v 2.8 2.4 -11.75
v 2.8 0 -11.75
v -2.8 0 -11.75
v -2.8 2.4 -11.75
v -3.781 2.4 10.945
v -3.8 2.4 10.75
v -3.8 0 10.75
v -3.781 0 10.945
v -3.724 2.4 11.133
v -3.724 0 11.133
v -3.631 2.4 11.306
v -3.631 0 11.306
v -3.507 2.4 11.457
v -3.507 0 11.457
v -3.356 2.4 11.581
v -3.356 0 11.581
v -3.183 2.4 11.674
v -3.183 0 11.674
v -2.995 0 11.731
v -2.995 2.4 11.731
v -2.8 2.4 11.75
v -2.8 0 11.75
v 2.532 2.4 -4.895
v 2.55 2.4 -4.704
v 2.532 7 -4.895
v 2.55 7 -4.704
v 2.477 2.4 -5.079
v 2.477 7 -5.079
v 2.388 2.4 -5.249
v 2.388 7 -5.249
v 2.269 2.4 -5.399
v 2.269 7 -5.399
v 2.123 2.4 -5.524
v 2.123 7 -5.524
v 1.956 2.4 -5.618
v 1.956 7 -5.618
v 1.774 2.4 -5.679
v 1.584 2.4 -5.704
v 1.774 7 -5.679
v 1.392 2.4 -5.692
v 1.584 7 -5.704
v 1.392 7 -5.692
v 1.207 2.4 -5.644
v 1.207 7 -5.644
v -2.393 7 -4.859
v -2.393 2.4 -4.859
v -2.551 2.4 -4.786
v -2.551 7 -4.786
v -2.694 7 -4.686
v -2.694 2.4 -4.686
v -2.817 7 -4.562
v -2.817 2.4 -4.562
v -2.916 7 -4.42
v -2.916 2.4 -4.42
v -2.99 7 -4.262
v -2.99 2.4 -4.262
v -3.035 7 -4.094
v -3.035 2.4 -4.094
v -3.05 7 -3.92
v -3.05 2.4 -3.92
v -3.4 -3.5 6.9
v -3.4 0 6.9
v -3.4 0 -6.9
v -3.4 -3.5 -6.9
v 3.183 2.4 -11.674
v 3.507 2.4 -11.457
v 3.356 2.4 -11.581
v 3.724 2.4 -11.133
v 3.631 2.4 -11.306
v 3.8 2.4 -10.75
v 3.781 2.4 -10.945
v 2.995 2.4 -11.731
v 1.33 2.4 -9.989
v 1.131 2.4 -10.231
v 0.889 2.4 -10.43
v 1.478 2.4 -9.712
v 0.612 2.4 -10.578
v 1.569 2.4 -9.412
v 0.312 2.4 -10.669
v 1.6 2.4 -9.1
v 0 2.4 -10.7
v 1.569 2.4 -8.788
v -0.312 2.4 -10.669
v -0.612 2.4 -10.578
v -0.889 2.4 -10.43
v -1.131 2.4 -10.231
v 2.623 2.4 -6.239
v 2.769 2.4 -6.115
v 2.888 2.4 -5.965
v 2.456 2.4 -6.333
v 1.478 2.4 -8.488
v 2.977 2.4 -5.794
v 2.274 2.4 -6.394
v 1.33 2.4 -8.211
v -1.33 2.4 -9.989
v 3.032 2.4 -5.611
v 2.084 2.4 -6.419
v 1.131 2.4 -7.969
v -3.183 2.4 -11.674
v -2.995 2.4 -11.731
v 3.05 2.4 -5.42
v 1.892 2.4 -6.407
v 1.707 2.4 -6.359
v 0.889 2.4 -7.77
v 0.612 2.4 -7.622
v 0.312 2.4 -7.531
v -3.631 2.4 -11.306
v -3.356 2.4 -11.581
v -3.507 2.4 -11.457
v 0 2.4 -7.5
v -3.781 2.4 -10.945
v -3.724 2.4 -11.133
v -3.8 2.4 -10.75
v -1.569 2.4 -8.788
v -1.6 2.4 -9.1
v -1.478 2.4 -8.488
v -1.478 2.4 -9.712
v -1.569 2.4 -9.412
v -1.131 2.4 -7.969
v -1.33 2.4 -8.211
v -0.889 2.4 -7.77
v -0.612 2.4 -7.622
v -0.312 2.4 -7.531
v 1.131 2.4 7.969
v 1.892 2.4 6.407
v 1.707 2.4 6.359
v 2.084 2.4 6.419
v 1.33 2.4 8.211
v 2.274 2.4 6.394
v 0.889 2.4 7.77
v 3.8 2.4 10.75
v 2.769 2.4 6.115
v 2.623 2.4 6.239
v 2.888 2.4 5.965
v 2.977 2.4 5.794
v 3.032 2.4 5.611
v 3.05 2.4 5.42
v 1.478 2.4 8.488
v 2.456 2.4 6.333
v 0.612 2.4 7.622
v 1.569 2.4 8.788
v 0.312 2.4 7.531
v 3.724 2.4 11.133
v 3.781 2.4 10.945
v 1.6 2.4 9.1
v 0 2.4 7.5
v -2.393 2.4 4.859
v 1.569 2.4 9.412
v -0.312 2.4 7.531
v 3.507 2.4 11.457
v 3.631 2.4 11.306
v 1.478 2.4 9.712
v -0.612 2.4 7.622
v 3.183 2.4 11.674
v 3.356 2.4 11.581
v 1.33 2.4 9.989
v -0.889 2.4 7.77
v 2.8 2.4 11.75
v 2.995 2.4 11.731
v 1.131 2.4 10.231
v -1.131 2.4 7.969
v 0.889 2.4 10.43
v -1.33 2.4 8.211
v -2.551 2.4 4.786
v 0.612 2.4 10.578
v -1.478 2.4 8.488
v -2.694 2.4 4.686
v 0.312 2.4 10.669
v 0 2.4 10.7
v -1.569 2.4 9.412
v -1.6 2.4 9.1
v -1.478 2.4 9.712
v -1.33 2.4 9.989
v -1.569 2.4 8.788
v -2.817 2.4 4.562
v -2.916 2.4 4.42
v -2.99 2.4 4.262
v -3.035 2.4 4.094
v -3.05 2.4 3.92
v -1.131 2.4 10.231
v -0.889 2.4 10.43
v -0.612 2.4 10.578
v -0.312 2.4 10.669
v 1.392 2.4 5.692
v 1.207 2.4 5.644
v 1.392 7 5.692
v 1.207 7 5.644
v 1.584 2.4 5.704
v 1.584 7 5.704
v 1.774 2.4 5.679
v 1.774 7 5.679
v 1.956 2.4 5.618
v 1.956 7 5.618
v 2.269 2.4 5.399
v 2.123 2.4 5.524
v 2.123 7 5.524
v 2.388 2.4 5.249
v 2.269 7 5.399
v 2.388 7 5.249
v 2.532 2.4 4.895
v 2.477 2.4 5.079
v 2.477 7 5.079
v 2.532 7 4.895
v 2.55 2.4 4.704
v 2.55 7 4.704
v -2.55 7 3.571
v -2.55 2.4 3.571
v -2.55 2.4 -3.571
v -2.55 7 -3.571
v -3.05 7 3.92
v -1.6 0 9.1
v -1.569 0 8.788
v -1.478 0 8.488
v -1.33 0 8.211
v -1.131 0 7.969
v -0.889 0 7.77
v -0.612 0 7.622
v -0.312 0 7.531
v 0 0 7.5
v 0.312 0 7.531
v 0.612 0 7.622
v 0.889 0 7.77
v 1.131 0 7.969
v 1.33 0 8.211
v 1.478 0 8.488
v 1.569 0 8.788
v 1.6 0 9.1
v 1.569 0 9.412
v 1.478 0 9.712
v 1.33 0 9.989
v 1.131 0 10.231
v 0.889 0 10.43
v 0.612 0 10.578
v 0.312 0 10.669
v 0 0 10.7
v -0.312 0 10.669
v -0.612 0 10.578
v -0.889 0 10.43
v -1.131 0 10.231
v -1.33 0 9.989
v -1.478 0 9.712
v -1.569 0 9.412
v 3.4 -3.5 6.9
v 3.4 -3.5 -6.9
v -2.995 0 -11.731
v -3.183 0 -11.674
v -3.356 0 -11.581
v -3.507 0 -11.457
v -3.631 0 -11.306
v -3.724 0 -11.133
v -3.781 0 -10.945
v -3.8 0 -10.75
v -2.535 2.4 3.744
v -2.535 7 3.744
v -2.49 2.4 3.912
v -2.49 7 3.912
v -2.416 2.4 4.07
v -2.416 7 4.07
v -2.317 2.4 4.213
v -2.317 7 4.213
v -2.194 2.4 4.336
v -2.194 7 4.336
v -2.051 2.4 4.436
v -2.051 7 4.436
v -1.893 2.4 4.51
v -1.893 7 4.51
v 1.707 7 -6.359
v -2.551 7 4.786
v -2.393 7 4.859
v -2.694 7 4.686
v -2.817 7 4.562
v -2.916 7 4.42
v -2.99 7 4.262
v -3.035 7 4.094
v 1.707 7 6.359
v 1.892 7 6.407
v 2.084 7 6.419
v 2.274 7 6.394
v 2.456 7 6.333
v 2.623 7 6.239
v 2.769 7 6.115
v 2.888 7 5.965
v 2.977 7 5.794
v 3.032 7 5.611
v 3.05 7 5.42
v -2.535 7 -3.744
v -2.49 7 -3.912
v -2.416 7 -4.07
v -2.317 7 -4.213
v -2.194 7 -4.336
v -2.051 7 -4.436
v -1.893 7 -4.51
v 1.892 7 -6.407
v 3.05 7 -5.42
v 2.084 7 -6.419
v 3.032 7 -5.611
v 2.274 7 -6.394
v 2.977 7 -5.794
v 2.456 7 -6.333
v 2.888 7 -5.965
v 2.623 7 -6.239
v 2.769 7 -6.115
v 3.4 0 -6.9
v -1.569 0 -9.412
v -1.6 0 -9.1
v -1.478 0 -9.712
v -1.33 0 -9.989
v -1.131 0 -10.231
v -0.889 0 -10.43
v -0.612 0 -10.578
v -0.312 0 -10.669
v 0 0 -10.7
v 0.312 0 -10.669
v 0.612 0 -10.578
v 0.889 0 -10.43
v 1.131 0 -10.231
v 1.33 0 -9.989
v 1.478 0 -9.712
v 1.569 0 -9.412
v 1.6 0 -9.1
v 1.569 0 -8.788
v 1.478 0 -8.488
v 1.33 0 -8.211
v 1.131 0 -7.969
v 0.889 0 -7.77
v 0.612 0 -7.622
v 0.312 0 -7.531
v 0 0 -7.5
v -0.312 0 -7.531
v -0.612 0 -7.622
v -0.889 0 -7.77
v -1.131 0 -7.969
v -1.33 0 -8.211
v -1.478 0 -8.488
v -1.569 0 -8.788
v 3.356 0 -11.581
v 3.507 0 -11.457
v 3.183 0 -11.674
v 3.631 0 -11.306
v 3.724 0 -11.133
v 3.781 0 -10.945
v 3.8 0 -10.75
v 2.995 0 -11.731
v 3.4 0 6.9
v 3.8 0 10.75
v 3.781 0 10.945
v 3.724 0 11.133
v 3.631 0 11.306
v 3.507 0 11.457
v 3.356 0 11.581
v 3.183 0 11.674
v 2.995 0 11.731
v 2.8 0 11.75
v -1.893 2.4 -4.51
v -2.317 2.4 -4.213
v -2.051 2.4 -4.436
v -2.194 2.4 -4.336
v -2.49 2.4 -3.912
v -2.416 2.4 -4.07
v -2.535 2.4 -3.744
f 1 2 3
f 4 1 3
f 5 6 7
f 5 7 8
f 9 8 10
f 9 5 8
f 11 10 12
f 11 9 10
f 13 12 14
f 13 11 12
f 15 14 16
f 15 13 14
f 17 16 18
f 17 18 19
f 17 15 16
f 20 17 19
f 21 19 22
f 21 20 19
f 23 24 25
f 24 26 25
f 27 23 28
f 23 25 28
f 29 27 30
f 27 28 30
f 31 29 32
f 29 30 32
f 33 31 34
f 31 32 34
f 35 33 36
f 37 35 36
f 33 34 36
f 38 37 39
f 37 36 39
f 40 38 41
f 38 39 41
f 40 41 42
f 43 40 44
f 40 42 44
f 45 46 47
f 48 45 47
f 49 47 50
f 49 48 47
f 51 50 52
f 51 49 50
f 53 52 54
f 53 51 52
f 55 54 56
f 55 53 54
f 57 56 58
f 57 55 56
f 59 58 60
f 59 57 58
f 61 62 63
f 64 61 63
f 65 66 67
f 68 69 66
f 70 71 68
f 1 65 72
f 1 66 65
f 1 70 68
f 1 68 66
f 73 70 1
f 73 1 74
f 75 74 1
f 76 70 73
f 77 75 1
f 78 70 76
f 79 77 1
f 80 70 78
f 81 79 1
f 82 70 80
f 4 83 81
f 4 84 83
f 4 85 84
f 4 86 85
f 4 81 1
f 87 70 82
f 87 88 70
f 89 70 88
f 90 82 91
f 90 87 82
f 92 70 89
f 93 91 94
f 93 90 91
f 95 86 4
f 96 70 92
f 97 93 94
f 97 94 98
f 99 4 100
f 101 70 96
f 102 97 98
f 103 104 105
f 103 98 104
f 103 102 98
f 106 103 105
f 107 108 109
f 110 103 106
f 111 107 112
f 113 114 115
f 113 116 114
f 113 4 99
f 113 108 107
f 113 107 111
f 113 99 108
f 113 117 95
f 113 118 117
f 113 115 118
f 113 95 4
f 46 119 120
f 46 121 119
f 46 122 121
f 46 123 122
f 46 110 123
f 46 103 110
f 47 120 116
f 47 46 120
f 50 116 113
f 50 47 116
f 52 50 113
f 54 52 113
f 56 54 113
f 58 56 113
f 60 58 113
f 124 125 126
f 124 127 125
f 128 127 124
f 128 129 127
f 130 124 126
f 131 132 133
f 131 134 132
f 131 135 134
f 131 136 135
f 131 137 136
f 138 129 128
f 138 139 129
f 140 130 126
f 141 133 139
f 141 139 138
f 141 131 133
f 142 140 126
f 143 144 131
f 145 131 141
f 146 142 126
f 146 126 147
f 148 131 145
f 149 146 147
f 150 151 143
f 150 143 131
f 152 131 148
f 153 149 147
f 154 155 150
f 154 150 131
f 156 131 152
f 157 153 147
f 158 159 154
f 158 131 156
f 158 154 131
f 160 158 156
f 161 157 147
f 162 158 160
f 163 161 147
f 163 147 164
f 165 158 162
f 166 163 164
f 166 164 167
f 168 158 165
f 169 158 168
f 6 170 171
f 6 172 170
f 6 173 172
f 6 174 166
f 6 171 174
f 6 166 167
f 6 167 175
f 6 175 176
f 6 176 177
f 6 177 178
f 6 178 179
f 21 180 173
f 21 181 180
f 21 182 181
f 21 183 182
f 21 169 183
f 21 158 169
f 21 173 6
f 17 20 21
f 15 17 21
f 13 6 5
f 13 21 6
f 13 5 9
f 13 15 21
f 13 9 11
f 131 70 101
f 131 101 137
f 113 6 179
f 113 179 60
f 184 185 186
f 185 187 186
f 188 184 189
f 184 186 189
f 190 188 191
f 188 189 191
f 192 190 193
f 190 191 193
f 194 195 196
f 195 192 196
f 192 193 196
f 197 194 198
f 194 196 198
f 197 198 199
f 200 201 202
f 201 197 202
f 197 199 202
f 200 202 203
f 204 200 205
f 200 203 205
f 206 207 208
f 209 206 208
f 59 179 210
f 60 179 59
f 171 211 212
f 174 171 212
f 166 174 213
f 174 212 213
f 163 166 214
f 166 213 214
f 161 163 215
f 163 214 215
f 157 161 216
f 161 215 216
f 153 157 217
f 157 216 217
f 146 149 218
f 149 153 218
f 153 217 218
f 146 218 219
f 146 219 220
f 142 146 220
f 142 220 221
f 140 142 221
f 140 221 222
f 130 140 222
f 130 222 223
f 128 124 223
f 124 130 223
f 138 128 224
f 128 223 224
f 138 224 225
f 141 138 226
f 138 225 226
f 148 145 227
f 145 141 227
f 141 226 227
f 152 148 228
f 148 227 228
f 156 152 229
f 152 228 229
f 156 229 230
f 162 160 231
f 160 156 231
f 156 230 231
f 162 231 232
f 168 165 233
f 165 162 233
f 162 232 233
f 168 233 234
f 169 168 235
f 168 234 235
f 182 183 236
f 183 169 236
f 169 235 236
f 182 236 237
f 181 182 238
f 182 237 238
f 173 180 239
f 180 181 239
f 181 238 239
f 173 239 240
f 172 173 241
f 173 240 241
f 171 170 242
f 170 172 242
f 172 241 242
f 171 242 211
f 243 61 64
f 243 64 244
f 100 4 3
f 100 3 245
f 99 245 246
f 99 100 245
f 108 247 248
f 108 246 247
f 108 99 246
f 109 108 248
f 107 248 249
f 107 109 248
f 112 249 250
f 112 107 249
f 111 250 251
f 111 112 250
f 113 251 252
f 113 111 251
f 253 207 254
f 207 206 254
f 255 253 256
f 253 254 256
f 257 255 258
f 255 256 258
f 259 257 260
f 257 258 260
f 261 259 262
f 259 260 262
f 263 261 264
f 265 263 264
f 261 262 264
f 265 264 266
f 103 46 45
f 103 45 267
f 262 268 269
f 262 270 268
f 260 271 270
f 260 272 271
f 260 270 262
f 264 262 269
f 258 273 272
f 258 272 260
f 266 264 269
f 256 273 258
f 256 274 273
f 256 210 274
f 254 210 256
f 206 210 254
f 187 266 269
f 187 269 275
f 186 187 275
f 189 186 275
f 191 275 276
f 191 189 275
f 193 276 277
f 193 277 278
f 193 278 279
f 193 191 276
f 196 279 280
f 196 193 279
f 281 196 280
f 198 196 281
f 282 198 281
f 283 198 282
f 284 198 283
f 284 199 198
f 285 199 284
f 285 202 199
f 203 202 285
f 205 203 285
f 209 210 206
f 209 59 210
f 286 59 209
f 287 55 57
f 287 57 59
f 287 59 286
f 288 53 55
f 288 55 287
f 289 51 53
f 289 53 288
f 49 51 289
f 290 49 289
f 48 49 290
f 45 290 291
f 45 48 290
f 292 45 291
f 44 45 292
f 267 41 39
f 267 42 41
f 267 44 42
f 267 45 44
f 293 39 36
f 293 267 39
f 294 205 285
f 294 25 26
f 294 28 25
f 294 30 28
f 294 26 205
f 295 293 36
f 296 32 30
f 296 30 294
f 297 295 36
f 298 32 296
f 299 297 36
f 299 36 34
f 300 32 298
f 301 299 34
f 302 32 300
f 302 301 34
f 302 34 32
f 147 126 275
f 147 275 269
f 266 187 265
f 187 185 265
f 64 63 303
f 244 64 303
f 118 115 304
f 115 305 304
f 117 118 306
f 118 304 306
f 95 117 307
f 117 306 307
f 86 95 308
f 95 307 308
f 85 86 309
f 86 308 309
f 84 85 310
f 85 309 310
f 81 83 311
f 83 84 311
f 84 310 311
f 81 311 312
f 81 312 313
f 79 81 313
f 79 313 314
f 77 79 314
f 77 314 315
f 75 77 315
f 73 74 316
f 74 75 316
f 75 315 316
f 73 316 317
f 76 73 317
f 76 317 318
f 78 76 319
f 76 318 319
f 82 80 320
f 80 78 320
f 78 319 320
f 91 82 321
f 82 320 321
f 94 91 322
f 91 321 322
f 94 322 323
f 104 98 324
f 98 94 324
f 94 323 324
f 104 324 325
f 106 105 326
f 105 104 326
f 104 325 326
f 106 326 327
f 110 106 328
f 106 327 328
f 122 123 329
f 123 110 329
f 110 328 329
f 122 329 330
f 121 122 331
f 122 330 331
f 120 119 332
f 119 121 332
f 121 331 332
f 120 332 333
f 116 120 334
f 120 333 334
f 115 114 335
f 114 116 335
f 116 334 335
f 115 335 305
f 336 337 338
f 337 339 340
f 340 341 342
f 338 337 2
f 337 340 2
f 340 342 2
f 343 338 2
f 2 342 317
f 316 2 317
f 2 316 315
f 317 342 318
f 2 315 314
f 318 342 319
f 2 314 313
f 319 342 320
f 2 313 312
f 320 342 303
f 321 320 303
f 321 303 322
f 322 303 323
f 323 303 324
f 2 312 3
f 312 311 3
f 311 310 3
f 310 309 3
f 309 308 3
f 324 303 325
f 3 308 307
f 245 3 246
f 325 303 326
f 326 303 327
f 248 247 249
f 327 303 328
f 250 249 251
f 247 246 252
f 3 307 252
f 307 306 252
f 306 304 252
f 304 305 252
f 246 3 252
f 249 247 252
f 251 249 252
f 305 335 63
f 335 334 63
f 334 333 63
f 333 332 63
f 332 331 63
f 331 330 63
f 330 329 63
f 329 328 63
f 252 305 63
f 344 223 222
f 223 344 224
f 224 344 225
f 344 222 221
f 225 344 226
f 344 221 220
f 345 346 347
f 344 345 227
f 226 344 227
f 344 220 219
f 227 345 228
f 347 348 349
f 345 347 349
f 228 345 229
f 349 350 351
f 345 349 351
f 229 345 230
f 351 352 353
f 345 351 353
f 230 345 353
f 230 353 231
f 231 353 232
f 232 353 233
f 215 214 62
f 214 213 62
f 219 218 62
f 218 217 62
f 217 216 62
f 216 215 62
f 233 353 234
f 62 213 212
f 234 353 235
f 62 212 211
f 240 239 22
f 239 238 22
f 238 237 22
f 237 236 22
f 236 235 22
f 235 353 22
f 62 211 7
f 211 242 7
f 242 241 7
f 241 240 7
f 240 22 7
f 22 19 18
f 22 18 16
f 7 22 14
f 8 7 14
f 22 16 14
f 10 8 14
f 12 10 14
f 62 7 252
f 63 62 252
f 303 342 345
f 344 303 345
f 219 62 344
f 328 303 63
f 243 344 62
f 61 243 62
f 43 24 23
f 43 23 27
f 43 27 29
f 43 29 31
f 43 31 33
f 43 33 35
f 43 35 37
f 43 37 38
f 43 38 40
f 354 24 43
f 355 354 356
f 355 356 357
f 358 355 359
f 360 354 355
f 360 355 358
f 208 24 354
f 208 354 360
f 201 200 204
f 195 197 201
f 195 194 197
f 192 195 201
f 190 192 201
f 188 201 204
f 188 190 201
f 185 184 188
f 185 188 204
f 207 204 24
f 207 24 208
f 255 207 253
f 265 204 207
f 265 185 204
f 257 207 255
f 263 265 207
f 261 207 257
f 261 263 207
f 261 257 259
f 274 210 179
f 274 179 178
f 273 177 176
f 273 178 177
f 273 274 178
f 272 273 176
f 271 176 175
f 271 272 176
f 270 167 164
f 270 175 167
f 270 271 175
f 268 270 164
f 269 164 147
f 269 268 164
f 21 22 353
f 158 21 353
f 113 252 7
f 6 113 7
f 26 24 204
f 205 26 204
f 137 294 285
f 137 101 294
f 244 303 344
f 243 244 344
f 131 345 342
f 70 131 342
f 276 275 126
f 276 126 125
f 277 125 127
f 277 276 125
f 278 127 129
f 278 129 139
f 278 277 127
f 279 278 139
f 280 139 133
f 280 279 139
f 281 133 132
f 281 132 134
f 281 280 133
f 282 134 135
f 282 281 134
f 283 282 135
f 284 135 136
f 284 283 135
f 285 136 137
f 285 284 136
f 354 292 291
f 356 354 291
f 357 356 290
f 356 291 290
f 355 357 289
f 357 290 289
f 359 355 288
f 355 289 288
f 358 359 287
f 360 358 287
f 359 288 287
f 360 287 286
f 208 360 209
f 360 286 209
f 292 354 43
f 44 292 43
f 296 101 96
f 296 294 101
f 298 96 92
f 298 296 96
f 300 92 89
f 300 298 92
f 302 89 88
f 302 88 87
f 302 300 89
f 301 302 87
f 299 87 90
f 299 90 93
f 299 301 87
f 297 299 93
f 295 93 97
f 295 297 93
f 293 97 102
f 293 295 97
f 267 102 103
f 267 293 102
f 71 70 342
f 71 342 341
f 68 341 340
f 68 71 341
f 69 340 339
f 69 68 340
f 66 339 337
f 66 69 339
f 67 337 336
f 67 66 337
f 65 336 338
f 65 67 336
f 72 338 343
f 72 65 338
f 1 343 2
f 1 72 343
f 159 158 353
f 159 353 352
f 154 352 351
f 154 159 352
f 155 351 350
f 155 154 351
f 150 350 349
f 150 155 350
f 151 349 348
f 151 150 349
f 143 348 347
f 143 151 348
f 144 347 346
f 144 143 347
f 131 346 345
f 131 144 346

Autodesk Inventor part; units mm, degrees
ref_plane "YZ Plane" through (0, 0, 0) normal (1, 0, 0) x (0, 1, 0)
ref_plane "XZ Plane" through (0, 0, 0) normal (0, 1, 0) x (-1, 0, 0)
ref_plane "XY Plane" through (0, 0, 0) normal (0, 0, 1) x (1, 0, 0)
sketch "Sketch1" plane through (0, 0, 0) normal (0, 1, 0) x (-1, 0, 0)
  line L0 (3.8, 11.75) -> (-3.8, 11.75)
  line L1 (-3.8, 11.75) -> (-3.8, -11.75)
  line L2 (-3.8, -11.75) -> (3.8, -11.75)
  line L3 (3.8, -11.75) -> (3.8, 11.75)
  circle A0 centre (0, 9.1) radius 1.6
  circle A1 centre (0, -9.1) radius 1.6
  point P0 (0, 0)
  dimension "d0" = 23.5
  dimension "d1" = 7.6
  dimension "d2" = 11.75
  dimension "d3" = 3.8
  dimension "d4" = 3.2
  dimension "d5" = 3.2
  dimension "d6" = 18.2
  dimension "d7" = 9.1
extrude "Extrusion1" add sketch "Sketch1" along normal blind 2.4
fillet "Fillet1" radius 1 4 edges at (3.8, 1.2, 11.75) (-3.8, 1.2, 11.75) (3.8, 1.2, -11.75) (-3.8, 1.2, -11.75)
sketch "Sketch2" plane through (0, 2.4, 0) normal (0, 1, 0) x (1, 0, 0)
  line L0 (-3.05, -4.6194) -> (-3.05, 4.6194)
  line L1 (-3.05, 4.6194) -> (3.05, 6.85)
  line L2 (3.05, 6.85) -> (3.05, -6.85)
  line L3 (3.05, -6.85) -> (-3.05, -4.6194)
  line L4 (2.55, -6.1348) -> (-2.55, -4.2698)
  line L5 (-2.55, -4.2698) -> (-2.55, 4.2698)
  line L6 (-2.55, 4.2698) -> (2.55, 6.1348)
  line L7 (2.55, 6.1348) -> (2.55, -6.1348)
  point P0 (0, 0)
  dimension "d11" = 69.914
  dimension "d13" = 13.7
  dimension "d14" = 6.1
  dimension "d15" = 3.05
  dimension "d17" = 0.5
  dimension "d18" = 0.5
  dimension "d19" = 0.5
  dimension "d20" = 0.5
  dimension "d21" = 6.85
  dimension "d22" = 69.914
  dimension "d23" = 69.914
extrude "Extrusion2" add sketch "Sketch2" along normal blind 4.6
fillet "Fillet2" radius 1 8 edges at (-3.05, 4.7, -4.6194) (-3.05, 4.7, 4.6194) (3.05, 4.7, 6.85) (3.05, 4.7, -6.85) (-2.55, 4.7, -4.2698) (-2.55, 4.7, 4.2698) (2.55, 4.7, -6.1348) (2.55, 4.7, 6.1348)
sketch "Sketch3" plane through (0, 0, 0) normal (0, -1, 0) x (1, 0, 0)
  line L0 (3.4, 6.9) -> (-3.4, 6.9)
  line L1 (-3.4, 6.9) -> (-3.4, -6.9)
  line L2 (-3.4, -6.9) -> (3.4, -6.9)
  line L3 (3.4, -6.9) -> (3.4, 6.9)
  point P0 (0, 0)
  dimension "d27" = 13.8
  dimension "d28" = 6.8
  dimension "d29" = 6.9
  dimension "d30" = 3.4
extrude "Extrusion3" add sketch "Sketch3" along normal blind 3.5
equation "\"d2\" = 0.5 * d0"
equation "\"d3\" = 0.5 * d1"
equation "\"d5\" = d4"
equation "\"d7\" = 0.5 * d6"
equation "\"d15\" = 0.5 * d14"
equation "\"d21\" = 0.5 * d13"
equation "\"d22\" = d11"
equation "\"d29\" = 0.5 * d27"
equation "\"d30\" = 0.5 * d28"
properties part number "15pin female connector"
